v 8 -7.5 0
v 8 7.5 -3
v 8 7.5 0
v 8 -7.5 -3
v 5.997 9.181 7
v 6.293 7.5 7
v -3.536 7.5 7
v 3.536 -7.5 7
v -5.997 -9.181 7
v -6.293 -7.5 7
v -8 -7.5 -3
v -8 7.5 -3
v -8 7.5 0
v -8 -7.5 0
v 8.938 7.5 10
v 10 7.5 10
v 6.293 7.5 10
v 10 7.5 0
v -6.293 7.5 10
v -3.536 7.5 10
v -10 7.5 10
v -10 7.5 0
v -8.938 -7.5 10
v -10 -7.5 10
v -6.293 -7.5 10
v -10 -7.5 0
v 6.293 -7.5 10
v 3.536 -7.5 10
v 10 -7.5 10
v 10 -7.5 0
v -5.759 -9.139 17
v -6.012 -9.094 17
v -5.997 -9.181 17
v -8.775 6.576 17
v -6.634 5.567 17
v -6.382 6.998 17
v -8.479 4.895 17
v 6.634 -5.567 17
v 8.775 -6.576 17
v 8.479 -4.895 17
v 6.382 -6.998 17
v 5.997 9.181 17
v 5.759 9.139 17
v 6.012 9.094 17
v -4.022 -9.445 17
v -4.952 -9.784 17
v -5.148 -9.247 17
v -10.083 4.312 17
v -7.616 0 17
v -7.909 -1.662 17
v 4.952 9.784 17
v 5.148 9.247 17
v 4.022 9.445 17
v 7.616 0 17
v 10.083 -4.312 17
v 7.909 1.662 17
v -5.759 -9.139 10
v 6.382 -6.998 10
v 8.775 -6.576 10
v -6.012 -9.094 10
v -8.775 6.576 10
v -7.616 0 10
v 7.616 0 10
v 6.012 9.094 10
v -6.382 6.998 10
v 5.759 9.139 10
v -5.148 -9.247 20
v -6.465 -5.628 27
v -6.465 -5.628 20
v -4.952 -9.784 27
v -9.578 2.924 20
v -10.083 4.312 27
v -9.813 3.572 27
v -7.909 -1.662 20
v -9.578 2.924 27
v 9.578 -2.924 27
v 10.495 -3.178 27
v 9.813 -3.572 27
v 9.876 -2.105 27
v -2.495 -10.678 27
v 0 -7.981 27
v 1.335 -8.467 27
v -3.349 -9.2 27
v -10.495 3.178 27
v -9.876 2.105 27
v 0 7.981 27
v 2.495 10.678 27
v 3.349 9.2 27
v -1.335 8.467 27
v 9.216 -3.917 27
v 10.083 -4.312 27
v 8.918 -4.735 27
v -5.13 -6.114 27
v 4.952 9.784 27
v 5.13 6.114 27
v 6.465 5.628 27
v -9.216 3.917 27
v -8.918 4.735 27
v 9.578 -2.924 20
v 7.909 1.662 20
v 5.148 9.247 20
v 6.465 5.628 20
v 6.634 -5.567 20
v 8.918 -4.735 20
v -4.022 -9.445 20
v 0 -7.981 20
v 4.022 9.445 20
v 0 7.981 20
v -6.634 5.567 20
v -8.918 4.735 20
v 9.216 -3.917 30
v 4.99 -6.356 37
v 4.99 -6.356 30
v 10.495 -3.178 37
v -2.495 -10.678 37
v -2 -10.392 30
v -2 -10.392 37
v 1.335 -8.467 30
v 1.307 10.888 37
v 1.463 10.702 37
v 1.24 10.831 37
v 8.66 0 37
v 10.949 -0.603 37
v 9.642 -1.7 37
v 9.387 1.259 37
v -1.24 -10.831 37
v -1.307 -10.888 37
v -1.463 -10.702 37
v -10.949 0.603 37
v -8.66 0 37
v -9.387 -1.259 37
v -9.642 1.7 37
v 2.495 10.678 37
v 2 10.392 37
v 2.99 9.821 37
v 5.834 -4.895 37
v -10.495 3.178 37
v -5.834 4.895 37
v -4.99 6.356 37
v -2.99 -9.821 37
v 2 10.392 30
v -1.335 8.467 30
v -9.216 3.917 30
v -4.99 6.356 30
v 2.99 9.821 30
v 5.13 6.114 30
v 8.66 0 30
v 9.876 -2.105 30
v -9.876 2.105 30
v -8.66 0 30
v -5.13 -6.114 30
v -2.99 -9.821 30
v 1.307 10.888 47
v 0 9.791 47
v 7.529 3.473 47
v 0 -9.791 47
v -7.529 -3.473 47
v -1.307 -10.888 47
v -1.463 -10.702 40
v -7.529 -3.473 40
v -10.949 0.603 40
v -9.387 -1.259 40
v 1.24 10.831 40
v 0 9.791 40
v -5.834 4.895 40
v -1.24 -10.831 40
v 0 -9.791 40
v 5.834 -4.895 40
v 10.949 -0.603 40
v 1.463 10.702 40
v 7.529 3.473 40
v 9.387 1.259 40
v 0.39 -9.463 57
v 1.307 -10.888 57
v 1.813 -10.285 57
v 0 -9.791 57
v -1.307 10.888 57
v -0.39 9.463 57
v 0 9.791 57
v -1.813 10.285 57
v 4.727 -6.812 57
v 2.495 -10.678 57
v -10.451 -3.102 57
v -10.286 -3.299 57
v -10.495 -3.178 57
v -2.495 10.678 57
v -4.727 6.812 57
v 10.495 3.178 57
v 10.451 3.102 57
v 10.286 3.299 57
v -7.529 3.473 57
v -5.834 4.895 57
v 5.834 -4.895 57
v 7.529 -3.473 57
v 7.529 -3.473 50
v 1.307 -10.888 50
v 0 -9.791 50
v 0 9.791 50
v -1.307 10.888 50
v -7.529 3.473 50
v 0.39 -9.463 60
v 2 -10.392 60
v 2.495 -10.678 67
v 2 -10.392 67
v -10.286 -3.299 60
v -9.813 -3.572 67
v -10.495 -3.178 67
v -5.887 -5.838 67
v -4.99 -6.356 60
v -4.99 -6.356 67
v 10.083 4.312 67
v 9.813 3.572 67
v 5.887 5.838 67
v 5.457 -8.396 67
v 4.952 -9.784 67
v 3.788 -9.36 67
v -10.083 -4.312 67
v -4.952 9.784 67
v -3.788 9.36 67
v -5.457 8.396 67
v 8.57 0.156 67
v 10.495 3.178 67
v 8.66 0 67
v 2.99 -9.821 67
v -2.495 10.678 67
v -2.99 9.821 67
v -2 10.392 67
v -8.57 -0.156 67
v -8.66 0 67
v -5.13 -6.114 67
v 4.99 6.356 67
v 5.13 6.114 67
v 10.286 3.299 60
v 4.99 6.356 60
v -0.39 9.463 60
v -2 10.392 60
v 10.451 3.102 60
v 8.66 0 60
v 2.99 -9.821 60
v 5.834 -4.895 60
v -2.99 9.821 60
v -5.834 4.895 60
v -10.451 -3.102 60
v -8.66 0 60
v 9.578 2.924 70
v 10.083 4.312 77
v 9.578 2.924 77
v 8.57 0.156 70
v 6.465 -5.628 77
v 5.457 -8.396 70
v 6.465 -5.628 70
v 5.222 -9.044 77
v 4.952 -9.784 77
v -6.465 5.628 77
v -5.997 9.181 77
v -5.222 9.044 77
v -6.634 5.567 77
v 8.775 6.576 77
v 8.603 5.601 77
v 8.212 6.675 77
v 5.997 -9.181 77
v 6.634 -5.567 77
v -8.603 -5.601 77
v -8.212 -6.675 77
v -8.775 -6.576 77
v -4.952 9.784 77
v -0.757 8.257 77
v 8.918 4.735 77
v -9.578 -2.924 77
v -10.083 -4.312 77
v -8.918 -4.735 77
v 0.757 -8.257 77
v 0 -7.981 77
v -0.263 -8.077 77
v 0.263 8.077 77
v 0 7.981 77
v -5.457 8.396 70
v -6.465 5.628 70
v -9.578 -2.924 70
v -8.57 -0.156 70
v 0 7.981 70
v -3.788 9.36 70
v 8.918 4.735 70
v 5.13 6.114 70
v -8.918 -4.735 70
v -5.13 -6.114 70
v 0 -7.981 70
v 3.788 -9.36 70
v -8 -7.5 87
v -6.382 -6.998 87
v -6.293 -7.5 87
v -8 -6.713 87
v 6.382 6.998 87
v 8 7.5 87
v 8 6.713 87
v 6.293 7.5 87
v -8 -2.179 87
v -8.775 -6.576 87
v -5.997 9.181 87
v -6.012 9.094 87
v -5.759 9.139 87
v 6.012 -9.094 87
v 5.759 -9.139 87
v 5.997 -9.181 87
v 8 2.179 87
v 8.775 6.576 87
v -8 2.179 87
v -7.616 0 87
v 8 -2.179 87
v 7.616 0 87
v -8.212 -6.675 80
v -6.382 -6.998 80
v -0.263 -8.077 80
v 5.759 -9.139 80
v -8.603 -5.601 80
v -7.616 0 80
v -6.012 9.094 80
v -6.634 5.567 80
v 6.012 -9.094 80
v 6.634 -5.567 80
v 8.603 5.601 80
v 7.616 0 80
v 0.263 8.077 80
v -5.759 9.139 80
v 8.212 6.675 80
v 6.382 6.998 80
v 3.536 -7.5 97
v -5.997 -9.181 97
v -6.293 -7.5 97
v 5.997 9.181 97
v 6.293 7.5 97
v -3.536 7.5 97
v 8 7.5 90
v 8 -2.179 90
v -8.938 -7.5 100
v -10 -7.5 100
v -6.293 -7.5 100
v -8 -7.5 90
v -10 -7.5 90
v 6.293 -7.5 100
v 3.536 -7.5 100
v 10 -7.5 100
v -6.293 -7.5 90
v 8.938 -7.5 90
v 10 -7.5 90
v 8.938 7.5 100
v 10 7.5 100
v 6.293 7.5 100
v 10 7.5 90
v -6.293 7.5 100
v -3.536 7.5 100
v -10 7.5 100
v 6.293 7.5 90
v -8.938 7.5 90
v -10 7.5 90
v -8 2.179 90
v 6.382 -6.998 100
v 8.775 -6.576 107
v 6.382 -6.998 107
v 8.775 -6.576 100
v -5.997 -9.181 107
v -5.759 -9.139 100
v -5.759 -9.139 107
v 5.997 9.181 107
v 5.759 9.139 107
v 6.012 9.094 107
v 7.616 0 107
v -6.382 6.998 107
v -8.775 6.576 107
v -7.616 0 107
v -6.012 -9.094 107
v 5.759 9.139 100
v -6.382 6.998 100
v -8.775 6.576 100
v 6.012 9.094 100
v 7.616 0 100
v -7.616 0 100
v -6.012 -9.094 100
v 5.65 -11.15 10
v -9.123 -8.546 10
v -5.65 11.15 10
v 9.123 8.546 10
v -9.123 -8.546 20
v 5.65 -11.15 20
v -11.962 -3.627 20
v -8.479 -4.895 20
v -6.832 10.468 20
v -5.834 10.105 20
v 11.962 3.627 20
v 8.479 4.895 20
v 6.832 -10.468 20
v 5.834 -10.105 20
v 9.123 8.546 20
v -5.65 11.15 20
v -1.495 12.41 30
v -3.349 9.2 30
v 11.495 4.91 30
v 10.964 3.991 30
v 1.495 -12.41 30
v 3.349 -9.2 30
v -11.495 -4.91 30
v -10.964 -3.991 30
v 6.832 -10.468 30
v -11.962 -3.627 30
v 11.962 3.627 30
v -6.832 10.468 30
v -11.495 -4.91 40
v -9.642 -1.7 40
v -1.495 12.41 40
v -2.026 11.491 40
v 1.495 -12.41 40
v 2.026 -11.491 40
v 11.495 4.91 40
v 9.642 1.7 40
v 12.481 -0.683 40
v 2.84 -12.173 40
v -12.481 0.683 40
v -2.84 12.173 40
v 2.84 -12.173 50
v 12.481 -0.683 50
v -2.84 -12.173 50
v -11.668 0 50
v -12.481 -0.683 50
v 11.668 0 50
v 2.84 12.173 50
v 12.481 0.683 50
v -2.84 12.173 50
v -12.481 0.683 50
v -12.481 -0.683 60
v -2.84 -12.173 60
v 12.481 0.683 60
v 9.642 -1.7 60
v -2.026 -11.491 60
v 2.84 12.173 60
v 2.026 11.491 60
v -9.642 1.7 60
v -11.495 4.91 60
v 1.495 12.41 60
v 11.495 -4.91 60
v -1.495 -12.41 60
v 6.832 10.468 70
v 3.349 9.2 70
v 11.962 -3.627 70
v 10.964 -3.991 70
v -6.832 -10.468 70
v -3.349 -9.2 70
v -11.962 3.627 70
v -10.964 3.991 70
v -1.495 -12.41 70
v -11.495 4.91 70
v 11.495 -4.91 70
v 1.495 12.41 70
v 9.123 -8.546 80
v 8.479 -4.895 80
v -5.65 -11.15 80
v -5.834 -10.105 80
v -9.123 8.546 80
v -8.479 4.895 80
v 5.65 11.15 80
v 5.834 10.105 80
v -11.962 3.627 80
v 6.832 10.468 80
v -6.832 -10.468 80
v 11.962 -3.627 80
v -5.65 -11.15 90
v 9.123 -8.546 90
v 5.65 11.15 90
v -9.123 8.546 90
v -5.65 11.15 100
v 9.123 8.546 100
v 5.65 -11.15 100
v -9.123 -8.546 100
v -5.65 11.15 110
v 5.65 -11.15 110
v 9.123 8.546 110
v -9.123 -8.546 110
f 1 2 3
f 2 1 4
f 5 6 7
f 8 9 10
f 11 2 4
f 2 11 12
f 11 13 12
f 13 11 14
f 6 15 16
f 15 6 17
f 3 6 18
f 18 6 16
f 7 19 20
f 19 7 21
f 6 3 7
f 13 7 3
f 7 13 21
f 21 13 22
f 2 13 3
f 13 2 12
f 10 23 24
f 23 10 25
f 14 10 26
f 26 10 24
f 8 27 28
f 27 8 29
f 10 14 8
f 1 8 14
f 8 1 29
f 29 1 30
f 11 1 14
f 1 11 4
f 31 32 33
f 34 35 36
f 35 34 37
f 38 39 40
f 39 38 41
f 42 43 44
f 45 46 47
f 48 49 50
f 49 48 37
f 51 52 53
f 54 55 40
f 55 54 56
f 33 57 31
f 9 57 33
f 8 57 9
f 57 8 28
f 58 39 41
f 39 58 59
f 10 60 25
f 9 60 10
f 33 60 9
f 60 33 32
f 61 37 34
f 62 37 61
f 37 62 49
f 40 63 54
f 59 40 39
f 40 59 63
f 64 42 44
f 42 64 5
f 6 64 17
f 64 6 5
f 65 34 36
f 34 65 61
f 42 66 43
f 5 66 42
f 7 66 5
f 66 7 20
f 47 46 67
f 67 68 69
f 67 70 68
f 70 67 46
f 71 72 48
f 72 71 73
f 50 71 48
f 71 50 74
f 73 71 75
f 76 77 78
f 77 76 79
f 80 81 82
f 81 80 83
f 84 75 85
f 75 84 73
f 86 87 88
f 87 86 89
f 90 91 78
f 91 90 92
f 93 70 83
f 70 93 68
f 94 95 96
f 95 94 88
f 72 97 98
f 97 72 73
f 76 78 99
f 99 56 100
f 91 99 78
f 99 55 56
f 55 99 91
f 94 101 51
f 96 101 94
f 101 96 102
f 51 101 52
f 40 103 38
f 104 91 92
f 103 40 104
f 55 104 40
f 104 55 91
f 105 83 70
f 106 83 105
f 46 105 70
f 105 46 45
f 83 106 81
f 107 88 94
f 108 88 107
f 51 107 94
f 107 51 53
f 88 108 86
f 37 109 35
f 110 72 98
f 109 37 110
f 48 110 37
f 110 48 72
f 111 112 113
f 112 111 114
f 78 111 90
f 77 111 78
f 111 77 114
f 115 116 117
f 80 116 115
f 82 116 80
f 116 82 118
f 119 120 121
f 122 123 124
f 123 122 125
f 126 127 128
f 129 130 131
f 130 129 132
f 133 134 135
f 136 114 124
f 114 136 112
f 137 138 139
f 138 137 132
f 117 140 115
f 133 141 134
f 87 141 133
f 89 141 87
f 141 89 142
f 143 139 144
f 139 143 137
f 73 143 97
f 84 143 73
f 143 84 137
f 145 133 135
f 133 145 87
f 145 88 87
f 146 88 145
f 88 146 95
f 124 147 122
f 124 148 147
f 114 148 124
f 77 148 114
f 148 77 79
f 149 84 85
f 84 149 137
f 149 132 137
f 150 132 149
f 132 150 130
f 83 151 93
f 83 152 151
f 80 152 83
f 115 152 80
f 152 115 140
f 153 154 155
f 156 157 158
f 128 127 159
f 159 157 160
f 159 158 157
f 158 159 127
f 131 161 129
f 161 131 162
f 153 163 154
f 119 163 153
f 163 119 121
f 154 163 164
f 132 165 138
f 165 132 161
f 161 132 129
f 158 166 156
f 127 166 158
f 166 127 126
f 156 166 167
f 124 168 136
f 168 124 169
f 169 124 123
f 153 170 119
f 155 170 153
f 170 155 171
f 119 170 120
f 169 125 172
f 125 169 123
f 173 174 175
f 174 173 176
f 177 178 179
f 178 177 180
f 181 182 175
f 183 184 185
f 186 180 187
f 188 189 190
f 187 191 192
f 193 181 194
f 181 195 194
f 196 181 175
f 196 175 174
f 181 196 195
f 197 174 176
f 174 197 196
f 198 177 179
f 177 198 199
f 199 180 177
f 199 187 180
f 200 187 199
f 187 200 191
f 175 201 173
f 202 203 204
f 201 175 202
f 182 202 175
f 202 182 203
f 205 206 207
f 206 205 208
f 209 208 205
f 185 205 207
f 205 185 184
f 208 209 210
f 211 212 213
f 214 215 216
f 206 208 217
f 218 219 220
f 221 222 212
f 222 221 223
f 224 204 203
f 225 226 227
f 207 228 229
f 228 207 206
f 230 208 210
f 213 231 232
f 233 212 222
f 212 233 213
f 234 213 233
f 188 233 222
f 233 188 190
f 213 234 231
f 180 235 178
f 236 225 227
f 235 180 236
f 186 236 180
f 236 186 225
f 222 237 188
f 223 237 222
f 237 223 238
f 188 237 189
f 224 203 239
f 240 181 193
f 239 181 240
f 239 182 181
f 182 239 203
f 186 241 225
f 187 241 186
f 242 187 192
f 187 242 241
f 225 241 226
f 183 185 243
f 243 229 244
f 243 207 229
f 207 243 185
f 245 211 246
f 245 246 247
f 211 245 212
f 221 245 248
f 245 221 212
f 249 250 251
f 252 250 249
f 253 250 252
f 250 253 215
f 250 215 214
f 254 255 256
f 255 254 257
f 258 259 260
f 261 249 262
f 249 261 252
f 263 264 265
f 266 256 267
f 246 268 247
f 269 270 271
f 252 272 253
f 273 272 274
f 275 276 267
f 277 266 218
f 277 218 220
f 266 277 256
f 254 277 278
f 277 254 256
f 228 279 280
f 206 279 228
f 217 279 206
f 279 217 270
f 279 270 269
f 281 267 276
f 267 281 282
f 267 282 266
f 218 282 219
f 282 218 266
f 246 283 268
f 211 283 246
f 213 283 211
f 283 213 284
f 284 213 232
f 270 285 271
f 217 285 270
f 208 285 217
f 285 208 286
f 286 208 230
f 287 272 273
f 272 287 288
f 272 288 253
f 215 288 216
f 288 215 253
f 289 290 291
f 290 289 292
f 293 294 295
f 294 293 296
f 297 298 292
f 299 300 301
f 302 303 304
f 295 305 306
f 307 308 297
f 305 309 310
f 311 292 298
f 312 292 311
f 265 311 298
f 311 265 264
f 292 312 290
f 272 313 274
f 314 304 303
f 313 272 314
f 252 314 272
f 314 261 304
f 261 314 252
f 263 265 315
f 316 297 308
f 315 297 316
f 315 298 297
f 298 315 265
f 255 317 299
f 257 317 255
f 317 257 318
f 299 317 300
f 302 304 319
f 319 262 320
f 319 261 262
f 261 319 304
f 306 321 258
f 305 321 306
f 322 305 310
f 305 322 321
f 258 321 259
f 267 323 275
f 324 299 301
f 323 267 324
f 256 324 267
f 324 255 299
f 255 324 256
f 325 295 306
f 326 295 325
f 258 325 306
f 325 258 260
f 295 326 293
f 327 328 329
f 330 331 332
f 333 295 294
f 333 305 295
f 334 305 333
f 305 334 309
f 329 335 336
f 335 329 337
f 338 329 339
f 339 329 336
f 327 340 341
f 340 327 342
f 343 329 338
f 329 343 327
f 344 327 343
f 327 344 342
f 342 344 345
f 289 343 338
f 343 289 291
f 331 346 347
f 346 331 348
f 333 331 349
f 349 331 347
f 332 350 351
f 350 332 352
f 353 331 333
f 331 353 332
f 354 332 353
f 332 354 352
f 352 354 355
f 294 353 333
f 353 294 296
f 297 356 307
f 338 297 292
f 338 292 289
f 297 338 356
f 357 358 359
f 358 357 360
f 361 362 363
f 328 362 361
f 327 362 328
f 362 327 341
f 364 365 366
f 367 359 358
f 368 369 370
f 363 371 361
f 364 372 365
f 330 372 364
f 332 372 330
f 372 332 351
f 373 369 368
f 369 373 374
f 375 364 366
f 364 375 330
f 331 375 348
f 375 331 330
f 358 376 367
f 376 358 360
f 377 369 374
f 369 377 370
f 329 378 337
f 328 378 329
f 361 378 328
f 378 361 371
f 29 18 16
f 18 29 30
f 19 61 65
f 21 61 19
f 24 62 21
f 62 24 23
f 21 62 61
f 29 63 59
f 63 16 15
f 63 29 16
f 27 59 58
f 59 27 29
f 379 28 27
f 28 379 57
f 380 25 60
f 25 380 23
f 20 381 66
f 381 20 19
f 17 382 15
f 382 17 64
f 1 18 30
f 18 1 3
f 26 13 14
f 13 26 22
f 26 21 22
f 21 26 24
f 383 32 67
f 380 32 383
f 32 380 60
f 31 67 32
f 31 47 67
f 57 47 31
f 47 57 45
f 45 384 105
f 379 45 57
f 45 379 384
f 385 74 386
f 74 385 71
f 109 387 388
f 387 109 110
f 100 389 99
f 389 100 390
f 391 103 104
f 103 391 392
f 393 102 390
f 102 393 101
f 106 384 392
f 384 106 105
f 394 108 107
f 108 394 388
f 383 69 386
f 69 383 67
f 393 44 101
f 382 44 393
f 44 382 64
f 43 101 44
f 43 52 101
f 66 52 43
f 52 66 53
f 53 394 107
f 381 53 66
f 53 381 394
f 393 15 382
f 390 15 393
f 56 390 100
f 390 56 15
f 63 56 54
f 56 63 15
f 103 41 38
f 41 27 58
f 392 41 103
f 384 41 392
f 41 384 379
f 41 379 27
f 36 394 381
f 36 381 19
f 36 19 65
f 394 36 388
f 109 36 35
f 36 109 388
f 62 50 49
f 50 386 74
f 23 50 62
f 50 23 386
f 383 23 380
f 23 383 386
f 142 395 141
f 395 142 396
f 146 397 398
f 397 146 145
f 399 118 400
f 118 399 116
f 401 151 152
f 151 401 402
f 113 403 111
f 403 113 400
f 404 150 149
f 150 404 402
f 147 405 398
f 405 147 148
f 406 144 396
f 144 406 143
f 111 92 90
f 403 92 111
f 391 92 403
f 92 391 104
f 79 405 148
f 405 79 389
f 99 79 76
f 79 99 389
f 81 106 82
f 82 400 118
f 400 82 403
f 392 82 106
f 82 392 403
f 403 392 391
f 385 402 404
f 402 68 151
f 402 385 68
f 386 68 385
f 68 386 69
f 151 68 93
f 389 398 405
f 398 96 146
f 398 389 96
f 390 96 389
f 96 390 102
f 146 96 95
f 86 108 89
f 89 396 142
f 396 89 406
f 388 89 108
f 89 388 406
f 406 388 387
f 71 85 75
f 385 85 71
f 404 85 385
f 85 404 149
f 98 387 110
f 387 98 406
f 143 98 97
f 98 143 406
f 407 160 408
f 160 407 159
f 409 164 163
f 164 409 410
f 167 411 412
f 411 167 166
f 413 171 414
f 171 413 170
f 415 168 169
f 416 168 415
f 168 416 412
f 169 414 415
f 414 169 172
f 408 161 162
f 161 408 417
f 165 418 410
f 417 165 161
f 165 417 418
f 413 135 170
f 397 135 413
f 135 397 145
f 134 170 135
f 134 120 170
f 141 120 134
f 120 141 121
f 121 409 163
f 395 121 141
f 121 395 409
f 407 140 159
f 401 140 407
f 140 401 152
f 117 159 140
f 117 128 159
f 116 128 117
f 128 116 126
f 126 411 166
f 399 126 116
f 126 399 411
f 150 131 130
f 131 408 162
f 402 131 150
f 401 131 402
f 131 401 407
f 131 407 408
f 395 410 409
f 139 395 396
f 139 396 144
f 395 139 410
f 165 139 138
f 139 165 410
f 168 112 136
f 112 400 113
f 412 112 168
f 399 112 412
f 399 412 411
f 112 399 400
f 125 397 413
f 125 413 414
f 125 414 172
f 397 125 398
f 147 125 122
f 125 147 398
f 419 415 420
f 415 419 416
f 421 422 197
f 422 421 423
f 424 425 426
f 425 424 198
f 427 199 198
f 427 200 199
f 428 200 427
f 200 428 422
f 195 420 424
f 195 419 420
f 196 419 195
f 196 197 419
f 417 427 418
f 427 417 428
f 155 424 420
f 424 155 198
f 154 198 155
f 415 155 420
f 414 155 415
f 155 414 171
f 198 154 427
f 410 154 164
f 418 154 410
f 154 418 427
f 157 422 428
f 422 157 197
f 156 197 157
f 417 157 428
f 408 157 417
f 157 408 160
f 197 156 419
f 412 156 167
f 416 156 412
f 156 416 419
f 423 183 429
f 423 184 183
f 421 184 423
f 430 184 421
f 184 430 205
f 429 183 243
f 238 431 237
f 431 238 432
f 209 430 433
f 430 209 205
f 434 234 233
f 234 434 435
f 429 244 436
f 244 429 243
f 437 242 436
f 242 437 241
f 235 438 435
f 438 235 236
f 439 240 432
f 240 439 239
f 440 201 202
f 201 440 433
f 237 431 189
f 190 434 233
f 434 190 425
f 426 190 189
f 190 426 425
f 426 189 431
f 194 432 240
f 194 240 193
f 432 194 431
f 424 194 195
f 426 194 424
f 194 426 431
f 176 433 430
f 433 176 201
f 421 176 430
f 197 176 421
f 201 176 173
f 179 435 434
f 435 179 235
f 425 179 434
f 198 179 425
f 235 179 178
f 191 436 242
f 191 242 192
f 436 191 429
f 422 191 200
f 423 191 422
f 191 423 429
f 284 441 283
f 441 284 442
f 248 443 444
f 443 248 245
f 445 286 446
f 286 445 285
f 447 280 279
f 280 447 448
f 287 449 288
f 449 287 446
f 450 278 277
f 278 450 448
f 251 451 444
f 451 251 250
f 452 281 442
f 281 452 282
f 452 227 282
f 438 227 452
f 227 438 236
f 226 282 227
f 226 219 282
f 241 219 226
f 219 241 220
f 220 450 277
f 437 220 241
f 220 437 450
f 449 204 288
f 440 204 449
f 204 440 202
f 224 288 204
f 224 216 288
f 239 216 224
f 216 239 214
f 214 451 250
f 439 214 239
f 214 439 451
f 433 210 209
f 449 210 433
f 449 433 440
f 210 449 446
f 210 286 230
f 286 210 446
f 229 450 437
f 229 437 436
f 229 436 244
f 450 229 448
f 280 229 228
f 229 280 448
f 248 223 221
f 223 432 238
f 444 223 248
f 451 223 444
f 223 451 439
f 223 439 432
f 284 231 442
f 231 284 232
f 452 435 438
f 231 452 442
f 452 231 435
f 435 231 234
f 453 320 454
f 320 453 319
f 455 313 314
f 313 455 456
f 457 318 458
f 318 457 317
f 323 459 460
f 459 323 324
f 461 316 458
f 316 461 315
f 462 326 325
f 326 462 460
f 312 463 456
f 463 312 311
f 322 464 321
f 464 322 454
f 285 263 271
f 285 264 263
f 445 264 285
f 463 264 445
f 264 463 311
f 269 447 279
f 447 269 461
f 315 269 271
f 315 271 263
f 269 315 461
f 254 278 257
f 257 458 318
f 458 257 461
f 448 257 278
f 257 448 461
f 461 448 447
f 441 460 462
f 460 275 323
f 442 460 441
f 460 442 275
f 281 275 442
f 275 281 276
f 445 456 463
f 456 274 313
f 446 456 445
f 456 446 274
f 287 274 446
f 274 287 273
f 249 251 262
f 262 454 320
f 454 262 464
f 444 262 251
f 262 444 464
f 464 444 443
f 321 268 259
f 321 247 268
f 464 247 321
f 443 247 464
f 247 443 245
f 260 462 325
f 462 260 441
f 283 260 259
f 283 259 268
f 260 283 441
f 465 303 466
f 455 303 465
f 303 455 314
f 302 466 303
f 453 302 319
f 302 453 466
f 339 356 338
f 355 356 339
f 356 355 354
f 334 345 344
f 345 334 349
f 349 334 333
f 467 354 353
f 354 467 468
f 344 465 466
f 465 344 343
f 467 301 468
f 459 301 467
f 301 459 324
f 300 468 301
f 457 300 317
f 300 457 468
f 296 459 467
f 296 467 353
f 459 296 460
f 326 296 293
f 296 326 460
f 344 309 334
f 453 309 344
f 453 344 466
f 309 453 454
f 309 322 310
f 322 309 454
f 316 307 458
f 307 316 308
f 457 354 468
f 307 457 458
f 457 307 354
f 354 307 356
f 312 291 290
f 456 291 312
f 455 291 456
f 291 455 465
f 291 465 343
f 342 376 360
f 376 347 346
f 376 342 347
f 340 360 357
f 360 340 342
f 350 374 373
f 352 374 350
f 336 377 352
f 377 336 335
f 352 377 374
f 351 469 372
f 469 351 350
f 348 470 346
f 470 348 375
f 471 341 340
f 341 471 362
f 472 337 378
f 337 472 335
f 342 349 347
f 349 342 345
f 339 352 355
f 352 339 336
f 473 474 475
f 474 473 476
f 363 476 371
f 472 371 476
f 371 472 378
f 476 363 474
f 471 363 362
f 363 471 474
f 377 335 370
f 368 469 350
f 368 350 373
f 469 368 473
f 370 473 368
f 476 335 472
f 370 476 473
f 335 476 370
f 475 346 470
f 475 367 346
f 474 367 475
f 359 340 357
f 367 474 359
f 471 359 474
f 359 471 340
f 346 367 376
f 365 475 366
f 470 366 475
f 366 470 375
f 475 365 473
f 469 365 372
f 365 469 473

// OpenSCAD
for (i=[0:10:100]) {
    {
rotate([0, 0, i*10]) {
    translate([0, 0, i+2]) {
        cube(size=[16, 15, 10], center=true);
};
};
};
};
for (i=[0:10:100]) {
    {
rotate([0, 0, i*-10]) {
    translate([0, 0, i+5]) {
        cube(size=[20, 15, 10], center=true);
};
};
};
};
